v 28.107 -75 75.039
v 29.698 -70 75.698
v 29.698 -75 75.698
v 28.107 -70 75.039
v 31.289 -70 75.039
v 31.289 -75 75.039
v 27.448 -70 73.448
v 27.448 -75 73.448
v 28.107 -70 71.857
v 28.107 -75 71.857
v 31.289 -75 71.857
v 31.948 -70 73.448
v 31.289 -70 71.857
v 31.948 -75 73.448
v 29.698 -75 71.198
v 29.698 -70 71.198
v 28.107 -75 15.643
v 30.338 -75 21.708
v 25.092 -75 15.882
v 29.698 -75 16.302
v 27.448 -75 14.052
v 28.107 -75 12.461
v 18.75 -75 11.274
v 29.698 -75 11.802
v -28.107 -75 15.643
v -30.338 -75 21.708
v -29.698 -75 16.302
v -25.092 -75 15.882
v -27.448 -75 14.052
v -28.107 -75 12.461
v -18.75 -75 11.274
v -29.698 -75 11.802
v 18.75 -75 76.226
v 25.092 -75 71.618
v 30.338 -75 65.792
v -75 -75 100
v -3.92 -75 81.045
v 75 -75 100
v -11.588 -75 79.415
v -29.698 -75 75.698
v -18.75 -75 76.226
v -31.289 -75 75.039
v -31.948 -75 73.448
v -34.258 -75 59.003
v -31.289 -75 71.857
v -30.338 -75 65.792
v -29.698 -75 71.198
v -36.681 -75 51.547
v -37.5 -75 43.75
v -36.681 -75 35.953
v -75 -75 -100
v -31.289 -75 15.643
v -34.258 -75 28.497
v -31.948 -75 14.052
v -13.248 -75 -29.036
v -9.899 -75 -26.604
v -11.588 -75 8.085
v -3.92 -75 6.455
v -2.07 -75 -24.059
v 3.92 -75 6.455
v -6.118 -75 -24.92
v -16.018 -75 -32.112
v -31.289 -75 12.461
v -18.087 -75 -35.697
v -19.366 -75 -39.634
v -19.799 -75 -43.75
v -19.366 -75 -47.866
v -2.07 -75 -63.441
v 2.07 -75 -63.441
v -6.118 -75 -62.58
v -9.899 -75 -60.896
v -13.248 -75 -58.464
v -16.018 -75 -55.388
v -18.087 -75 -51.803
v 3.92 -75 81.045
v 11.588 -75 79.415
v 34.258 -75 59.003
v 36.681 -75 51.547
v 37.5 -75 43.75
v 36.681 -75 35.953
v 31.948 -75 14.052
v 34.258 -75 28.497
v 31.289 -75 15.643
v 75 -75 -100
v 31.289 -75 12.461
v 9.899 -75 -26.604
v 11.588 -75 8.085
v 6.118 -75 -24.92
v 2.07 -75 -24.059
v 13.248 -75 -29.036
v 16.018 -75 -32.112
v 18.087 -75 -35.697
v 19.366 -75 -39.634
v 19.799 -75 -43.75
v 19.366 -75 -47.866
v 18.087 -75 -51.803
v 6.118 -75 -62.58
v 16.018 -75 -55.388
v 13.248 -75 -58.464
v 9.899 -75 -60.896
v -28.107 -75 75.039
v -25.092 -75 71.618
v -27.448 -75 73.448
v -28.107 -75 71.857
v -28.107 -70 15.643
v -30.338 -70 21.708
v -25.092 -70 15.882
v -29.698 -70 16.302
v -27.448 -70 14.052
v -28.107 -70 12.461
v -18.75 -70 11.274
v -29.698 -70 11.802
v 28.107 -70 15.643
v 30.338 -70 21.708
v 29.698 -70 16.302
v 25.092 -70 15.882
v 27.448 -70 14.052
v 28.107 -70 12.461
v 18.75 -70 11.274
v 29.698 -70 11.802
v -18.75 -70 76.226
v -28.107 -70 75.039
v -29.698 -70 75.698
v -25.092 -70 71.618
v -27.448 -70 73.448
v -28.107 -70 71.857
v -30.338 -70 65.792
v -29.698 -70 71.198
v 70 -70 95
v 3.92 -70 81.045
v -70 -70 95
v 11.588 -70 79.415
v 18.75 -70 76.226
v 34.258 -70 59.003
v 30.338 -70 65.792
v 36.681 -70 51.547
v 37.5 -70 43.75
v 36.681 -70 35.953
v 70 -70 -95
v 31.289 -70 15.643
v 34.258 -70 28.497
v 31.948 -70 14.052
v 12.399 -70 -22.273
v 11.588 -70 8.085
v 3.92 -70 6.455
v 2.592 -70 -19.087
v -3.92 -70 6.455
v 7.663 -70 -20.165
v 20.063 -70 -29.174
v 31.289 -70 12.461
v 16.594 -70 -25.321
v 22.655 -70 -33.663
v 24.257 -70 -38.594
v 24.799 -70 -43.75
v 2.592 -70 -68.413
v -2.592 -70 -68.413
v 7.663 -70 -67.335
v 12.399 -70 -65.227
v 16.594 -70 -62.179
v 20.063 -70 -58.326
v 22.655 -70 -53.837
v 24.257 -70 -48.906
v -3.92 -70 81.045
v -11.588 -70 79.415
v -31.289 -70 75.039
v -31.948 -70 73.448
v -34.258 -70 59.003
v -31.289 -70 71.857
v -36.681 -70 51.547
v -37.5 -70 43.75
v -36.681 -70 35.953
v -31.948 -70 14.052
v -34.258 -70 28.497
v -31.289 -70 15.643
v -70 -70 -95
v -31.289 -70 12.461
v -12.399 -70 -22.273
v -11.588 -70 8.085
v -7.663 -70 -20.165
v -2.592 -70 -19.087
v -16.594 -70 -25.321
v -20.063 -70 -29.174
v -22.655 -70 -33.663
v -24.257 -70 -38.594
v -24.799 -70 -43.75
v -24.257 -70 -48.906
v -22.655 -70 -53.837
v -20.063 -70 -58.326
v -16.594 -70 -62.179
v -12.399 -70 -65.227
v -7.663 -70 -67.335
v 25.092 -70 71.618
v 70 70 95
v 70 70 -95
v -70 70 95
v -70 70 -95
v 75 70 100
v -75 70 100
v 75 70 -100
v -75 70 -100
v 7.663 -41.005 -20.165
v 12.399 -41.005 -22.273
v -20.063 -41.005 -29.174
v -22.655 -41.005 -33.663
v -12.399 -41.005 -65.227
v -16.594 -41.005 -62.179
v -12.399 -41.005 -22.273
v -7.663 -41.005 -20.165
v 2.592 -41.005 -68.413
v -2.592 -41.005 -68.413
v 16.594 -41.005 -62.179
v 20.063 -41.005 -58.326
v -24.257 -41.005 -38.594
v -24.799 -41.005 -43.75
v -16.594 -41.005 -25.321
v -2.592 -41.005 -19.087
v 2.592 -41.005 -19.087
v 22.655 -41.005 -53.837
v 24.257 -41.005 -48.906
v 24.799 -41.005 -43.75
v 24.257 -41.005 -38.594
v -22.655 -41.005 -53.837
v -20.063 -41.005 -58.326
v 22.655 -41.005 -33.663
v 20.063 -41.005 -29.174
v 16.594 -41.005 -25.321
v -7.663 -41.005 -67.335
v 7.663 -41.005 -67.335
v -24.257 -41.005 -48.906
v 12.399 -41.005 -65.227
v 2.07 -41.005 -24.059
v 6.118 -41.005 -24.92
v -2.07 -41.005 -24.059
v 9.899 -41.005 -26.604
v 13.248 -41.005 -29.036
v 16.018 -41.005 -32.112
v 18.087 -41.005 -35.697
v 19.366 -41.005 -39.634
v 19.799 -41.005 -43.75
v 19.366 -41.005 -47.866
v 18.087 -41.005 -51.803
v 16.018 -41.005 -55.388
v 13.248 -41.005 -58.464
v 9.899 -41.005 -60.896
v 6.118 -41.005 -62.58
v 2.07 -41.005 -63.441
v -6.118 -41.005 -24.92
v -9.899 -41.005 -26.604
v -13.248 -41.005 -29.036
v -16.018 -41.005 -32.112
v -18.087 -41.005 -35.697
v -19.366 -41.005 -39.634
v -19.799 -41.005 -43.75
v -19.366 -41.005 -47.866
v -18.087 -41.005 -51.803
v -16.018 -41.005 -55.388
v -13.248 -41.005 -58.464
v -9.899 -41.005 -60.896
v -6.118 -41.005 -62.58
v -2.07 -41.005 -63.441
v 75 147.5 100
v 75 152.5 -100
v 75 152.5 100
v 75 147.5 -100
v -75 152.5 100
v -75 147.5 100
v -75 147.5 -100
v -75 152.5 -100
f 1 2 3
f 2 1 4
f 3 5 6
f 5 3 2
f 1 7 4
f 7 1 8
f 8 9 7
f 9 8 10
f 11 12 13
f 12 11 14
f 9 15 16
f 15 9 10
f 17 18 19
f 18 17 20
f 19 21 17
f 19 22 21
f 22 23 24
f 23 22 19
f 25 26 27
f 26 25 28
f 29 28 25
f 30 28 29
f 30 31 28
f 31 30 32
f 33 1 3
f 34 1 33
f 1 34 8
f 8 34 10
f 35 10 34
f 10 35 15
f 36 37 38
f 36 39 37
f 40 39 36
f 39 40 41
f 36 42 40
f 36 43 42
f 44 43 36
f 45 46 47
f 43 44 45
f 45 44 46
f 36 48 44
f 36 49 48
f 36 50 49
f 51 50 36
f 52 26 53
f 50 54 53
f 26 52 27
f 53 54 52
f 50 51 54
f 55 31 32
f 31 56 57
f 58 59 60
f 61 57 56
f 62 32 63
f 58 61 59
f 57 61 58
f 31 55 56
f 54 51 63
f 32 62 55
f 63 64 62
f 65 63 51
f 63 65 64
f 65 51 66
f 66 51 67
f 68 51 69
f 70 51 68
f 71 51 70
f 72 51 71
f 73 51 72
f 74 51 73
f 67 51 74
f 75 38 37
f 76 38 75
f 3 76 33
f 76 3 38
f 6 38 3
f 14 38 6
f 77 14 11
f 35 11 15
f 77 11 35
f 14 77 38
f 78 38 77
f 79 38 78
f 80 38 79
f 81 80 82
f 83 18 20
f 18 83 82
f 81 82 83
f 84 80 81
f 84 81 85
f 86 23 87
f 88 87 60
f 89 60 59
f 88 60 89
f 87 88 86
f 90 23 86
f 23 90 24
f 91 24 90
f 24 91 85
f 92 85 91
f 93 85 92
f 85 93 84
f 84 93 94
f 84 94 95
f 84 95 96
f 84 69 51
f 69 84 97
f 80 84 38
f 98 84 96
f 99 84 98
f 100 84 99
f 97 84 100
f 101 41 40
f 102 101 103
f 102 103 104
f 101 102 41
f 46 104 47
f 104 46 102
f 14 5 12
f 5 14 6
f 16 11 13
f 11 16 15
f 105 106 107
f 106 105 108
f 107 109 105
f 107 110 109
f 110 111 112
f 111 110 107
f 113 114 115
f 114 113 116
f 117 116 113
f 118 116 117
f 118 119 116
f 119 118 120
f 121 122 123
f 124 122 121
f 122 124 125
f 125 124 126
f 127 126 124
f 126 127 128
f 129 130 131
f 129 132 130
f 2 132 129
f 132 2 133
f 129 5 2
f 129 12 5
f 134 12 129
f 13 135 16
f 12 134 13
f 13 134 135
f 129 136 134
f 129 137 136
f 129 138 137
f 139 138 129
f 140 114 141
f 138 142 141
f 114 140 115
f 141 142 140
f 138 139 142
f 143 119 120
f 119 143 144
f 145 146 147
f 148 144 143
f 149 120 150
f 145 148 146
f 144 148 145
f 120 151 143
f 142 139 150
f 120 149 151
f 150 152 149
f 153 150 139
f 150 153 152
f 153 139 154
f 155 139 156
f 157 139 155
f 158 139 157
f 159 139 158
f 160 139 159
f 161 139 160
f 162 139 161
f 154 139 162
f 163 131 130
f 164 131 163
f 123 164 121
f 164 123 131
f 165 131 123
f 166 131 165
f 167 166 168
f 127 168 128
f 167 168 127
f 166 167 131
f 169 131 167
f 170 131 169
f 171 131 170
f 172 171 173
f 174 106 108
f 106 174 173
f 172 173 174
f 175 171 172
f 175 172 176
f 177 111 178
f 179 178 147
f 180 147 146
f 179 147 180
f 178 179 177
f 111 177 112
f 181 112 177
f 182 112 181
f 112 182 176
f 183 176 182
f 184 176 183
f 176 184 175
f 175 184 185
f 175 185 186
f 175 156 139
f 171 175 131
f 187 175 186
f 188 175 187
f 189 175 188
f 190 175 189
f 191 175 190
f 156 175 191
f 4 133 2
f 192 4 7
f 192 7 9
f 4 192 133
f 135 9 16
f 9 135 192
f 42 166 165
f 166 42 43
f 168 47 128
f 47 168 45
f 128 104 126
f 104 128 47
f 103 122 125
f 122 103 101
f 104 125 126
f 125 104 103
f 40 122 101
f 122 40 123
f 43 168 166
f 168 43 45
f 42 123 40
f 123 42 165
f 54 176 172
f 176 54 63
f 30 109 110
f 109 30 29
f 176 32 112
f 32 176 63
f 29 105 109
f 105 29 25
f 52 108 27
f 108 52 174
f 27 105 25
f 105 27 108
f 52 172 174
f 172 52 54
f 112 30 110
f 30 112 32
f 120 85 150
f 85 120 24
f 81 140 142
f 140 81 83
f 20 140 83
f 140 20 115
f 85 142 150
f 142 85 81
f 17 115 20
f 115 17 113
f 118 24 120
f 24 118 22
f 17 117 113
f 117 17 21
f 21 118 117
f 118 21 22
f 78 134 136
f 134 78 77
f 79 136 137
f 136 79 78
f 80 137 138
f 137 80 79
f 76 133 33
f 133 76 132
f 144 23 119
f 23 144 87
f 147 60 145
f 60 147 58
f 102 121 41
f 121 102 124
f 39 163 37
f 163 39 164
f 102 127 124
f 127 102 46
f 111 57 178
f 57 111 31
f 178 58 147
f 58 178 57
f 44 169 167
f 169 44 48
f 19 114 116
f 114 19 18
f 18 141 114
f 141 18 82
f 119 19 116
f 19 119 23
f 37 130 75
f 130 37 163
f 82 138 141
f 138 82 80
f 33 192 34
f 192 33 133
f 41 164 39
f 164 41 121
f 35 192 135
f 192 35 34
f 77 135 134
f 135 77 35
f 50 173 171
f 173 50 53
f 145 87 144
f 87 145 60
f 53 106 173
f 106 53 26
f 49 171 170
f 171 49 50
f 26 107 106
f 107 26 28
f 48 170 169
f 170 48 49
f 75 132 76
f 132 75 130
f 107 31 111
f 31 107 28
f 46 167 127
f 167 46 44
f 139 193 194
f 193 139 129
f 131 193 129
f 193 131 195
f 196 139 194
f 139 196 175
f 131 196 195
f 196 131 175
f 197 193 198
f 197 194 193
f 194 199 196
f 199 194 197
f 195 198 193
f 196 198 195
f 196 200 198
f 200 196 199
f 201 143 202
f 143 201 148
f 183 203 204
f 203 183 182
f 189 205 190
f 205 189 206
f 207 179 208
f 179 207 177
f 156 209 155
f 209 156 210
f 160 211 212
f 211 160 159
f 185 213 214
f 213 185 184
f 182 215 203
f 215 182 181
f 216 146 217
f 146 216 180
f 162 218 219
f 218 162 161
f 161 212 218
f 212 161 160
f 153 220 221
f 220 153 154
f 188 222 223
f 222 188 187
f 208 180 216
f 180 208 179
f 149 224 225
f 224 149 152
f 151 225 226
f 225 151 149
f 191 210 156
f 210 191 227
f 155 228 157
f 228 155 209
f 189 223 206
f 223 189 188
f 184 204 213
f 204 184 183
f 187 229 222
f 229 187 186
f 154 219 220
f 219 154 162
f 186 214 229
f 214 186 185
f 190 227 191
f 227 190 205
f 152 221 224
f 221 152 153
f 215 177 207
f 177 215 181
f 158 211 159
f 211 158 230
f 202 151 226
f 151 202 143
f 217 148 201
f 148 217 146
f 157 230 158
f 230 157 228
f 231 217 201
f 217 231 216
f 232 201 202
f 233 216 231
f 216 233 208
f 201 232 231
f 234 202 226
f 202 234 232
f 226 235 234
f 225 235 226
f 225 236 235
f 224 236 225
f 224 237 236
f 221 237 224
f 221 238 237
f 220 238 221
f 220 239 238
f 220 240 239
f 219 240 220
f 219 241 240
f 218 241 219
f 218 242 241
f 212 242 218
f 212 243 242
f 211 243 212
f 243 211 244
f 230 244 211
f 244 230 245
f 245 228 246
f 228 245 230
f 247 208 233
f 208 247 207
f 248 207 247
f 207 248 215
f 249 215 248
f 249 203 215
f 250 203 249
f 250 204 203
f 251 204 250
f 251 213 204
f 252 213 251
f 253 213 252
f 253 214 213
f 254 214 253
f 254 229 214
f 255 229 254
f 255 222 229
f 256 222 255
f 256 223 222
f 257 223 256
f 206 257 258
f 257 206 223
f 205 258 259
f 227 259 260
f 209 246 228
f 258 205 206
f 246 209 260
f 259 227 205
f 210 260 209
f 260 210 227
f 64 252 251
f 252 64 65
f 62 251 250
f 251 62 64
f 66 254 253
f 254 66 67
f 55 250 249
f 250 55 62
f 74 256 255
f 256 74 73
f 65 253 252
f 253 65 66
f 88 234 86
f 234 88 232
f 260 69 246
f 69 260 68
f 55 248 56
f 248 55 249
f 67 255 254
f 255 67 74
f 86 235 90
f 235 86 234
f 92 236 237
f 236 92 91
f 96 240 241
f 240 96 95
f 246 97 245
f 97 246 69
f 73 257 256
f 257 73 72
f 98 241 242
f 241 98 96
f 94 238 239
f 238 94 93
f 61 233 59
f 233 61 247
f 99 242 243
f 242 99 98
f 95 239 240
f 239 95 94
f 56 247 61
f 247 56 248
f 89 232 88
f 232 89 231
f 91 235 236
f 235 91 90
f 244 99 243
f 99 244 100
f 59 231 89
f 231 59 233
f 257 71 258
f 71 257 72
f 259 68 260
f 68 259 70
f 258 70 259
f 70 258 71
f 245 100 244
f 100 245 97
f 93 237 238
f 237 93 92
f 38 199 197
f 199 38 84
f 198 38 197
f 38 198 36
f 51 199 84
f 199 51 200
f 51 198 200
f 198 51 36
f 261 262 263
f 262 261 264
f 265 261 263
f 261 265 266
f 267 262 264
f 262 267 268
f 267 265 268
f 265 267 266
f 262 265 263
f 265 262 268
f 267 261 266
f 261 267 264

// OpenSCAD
r=7.5/2;
a=2.8;
f0=130;

thick=.5;
dx=15;
dy=15;
dz=20;
duct_rate=.5;

idx=dx-thick*2;
idy=dy-thick*2;
idz=dz-thick*2;
V=idx*idy*idz/1000;
rd=a/sqrt(1/duct_rate);
l=(30000*rd*rd*PI)/(f0*f0*V)-1.5*rd;
L=3.125*a;


echo(V);

difference(){
	translate([0,-thick/2*10,0])cube([dx*10,(dy-thick)*10,dz*10],center=true);
	union(){
		difference(){
			union(){
				cube([idx*10,idy*10,idz*10],center=true);
				translate([0,-idy*10/2, L*10/2])rotate([90,0,0]){
					cylinder(r=r*10,h=thick*10);
					for(i=[0:3])rotate([0,0,i*90+45])translate([42,0,0])cylinder(d=4.5,h=thick*10);
				}
			}
			translate([0,-idy*10/2-.01,-L*10/2])rotate([90,0,180])cylinder(r=(rd+thick)*10,h=l*10);
		}
		translate([0,-idy*10/2-thick*10,-L*10/2])rotate([90,0,180])cylinder(r=rd*10,h=(l+thick)*10);
	}
}

translate([0,dy*10,0])cube([dx*10,thick*10,dz*10],center=true);
